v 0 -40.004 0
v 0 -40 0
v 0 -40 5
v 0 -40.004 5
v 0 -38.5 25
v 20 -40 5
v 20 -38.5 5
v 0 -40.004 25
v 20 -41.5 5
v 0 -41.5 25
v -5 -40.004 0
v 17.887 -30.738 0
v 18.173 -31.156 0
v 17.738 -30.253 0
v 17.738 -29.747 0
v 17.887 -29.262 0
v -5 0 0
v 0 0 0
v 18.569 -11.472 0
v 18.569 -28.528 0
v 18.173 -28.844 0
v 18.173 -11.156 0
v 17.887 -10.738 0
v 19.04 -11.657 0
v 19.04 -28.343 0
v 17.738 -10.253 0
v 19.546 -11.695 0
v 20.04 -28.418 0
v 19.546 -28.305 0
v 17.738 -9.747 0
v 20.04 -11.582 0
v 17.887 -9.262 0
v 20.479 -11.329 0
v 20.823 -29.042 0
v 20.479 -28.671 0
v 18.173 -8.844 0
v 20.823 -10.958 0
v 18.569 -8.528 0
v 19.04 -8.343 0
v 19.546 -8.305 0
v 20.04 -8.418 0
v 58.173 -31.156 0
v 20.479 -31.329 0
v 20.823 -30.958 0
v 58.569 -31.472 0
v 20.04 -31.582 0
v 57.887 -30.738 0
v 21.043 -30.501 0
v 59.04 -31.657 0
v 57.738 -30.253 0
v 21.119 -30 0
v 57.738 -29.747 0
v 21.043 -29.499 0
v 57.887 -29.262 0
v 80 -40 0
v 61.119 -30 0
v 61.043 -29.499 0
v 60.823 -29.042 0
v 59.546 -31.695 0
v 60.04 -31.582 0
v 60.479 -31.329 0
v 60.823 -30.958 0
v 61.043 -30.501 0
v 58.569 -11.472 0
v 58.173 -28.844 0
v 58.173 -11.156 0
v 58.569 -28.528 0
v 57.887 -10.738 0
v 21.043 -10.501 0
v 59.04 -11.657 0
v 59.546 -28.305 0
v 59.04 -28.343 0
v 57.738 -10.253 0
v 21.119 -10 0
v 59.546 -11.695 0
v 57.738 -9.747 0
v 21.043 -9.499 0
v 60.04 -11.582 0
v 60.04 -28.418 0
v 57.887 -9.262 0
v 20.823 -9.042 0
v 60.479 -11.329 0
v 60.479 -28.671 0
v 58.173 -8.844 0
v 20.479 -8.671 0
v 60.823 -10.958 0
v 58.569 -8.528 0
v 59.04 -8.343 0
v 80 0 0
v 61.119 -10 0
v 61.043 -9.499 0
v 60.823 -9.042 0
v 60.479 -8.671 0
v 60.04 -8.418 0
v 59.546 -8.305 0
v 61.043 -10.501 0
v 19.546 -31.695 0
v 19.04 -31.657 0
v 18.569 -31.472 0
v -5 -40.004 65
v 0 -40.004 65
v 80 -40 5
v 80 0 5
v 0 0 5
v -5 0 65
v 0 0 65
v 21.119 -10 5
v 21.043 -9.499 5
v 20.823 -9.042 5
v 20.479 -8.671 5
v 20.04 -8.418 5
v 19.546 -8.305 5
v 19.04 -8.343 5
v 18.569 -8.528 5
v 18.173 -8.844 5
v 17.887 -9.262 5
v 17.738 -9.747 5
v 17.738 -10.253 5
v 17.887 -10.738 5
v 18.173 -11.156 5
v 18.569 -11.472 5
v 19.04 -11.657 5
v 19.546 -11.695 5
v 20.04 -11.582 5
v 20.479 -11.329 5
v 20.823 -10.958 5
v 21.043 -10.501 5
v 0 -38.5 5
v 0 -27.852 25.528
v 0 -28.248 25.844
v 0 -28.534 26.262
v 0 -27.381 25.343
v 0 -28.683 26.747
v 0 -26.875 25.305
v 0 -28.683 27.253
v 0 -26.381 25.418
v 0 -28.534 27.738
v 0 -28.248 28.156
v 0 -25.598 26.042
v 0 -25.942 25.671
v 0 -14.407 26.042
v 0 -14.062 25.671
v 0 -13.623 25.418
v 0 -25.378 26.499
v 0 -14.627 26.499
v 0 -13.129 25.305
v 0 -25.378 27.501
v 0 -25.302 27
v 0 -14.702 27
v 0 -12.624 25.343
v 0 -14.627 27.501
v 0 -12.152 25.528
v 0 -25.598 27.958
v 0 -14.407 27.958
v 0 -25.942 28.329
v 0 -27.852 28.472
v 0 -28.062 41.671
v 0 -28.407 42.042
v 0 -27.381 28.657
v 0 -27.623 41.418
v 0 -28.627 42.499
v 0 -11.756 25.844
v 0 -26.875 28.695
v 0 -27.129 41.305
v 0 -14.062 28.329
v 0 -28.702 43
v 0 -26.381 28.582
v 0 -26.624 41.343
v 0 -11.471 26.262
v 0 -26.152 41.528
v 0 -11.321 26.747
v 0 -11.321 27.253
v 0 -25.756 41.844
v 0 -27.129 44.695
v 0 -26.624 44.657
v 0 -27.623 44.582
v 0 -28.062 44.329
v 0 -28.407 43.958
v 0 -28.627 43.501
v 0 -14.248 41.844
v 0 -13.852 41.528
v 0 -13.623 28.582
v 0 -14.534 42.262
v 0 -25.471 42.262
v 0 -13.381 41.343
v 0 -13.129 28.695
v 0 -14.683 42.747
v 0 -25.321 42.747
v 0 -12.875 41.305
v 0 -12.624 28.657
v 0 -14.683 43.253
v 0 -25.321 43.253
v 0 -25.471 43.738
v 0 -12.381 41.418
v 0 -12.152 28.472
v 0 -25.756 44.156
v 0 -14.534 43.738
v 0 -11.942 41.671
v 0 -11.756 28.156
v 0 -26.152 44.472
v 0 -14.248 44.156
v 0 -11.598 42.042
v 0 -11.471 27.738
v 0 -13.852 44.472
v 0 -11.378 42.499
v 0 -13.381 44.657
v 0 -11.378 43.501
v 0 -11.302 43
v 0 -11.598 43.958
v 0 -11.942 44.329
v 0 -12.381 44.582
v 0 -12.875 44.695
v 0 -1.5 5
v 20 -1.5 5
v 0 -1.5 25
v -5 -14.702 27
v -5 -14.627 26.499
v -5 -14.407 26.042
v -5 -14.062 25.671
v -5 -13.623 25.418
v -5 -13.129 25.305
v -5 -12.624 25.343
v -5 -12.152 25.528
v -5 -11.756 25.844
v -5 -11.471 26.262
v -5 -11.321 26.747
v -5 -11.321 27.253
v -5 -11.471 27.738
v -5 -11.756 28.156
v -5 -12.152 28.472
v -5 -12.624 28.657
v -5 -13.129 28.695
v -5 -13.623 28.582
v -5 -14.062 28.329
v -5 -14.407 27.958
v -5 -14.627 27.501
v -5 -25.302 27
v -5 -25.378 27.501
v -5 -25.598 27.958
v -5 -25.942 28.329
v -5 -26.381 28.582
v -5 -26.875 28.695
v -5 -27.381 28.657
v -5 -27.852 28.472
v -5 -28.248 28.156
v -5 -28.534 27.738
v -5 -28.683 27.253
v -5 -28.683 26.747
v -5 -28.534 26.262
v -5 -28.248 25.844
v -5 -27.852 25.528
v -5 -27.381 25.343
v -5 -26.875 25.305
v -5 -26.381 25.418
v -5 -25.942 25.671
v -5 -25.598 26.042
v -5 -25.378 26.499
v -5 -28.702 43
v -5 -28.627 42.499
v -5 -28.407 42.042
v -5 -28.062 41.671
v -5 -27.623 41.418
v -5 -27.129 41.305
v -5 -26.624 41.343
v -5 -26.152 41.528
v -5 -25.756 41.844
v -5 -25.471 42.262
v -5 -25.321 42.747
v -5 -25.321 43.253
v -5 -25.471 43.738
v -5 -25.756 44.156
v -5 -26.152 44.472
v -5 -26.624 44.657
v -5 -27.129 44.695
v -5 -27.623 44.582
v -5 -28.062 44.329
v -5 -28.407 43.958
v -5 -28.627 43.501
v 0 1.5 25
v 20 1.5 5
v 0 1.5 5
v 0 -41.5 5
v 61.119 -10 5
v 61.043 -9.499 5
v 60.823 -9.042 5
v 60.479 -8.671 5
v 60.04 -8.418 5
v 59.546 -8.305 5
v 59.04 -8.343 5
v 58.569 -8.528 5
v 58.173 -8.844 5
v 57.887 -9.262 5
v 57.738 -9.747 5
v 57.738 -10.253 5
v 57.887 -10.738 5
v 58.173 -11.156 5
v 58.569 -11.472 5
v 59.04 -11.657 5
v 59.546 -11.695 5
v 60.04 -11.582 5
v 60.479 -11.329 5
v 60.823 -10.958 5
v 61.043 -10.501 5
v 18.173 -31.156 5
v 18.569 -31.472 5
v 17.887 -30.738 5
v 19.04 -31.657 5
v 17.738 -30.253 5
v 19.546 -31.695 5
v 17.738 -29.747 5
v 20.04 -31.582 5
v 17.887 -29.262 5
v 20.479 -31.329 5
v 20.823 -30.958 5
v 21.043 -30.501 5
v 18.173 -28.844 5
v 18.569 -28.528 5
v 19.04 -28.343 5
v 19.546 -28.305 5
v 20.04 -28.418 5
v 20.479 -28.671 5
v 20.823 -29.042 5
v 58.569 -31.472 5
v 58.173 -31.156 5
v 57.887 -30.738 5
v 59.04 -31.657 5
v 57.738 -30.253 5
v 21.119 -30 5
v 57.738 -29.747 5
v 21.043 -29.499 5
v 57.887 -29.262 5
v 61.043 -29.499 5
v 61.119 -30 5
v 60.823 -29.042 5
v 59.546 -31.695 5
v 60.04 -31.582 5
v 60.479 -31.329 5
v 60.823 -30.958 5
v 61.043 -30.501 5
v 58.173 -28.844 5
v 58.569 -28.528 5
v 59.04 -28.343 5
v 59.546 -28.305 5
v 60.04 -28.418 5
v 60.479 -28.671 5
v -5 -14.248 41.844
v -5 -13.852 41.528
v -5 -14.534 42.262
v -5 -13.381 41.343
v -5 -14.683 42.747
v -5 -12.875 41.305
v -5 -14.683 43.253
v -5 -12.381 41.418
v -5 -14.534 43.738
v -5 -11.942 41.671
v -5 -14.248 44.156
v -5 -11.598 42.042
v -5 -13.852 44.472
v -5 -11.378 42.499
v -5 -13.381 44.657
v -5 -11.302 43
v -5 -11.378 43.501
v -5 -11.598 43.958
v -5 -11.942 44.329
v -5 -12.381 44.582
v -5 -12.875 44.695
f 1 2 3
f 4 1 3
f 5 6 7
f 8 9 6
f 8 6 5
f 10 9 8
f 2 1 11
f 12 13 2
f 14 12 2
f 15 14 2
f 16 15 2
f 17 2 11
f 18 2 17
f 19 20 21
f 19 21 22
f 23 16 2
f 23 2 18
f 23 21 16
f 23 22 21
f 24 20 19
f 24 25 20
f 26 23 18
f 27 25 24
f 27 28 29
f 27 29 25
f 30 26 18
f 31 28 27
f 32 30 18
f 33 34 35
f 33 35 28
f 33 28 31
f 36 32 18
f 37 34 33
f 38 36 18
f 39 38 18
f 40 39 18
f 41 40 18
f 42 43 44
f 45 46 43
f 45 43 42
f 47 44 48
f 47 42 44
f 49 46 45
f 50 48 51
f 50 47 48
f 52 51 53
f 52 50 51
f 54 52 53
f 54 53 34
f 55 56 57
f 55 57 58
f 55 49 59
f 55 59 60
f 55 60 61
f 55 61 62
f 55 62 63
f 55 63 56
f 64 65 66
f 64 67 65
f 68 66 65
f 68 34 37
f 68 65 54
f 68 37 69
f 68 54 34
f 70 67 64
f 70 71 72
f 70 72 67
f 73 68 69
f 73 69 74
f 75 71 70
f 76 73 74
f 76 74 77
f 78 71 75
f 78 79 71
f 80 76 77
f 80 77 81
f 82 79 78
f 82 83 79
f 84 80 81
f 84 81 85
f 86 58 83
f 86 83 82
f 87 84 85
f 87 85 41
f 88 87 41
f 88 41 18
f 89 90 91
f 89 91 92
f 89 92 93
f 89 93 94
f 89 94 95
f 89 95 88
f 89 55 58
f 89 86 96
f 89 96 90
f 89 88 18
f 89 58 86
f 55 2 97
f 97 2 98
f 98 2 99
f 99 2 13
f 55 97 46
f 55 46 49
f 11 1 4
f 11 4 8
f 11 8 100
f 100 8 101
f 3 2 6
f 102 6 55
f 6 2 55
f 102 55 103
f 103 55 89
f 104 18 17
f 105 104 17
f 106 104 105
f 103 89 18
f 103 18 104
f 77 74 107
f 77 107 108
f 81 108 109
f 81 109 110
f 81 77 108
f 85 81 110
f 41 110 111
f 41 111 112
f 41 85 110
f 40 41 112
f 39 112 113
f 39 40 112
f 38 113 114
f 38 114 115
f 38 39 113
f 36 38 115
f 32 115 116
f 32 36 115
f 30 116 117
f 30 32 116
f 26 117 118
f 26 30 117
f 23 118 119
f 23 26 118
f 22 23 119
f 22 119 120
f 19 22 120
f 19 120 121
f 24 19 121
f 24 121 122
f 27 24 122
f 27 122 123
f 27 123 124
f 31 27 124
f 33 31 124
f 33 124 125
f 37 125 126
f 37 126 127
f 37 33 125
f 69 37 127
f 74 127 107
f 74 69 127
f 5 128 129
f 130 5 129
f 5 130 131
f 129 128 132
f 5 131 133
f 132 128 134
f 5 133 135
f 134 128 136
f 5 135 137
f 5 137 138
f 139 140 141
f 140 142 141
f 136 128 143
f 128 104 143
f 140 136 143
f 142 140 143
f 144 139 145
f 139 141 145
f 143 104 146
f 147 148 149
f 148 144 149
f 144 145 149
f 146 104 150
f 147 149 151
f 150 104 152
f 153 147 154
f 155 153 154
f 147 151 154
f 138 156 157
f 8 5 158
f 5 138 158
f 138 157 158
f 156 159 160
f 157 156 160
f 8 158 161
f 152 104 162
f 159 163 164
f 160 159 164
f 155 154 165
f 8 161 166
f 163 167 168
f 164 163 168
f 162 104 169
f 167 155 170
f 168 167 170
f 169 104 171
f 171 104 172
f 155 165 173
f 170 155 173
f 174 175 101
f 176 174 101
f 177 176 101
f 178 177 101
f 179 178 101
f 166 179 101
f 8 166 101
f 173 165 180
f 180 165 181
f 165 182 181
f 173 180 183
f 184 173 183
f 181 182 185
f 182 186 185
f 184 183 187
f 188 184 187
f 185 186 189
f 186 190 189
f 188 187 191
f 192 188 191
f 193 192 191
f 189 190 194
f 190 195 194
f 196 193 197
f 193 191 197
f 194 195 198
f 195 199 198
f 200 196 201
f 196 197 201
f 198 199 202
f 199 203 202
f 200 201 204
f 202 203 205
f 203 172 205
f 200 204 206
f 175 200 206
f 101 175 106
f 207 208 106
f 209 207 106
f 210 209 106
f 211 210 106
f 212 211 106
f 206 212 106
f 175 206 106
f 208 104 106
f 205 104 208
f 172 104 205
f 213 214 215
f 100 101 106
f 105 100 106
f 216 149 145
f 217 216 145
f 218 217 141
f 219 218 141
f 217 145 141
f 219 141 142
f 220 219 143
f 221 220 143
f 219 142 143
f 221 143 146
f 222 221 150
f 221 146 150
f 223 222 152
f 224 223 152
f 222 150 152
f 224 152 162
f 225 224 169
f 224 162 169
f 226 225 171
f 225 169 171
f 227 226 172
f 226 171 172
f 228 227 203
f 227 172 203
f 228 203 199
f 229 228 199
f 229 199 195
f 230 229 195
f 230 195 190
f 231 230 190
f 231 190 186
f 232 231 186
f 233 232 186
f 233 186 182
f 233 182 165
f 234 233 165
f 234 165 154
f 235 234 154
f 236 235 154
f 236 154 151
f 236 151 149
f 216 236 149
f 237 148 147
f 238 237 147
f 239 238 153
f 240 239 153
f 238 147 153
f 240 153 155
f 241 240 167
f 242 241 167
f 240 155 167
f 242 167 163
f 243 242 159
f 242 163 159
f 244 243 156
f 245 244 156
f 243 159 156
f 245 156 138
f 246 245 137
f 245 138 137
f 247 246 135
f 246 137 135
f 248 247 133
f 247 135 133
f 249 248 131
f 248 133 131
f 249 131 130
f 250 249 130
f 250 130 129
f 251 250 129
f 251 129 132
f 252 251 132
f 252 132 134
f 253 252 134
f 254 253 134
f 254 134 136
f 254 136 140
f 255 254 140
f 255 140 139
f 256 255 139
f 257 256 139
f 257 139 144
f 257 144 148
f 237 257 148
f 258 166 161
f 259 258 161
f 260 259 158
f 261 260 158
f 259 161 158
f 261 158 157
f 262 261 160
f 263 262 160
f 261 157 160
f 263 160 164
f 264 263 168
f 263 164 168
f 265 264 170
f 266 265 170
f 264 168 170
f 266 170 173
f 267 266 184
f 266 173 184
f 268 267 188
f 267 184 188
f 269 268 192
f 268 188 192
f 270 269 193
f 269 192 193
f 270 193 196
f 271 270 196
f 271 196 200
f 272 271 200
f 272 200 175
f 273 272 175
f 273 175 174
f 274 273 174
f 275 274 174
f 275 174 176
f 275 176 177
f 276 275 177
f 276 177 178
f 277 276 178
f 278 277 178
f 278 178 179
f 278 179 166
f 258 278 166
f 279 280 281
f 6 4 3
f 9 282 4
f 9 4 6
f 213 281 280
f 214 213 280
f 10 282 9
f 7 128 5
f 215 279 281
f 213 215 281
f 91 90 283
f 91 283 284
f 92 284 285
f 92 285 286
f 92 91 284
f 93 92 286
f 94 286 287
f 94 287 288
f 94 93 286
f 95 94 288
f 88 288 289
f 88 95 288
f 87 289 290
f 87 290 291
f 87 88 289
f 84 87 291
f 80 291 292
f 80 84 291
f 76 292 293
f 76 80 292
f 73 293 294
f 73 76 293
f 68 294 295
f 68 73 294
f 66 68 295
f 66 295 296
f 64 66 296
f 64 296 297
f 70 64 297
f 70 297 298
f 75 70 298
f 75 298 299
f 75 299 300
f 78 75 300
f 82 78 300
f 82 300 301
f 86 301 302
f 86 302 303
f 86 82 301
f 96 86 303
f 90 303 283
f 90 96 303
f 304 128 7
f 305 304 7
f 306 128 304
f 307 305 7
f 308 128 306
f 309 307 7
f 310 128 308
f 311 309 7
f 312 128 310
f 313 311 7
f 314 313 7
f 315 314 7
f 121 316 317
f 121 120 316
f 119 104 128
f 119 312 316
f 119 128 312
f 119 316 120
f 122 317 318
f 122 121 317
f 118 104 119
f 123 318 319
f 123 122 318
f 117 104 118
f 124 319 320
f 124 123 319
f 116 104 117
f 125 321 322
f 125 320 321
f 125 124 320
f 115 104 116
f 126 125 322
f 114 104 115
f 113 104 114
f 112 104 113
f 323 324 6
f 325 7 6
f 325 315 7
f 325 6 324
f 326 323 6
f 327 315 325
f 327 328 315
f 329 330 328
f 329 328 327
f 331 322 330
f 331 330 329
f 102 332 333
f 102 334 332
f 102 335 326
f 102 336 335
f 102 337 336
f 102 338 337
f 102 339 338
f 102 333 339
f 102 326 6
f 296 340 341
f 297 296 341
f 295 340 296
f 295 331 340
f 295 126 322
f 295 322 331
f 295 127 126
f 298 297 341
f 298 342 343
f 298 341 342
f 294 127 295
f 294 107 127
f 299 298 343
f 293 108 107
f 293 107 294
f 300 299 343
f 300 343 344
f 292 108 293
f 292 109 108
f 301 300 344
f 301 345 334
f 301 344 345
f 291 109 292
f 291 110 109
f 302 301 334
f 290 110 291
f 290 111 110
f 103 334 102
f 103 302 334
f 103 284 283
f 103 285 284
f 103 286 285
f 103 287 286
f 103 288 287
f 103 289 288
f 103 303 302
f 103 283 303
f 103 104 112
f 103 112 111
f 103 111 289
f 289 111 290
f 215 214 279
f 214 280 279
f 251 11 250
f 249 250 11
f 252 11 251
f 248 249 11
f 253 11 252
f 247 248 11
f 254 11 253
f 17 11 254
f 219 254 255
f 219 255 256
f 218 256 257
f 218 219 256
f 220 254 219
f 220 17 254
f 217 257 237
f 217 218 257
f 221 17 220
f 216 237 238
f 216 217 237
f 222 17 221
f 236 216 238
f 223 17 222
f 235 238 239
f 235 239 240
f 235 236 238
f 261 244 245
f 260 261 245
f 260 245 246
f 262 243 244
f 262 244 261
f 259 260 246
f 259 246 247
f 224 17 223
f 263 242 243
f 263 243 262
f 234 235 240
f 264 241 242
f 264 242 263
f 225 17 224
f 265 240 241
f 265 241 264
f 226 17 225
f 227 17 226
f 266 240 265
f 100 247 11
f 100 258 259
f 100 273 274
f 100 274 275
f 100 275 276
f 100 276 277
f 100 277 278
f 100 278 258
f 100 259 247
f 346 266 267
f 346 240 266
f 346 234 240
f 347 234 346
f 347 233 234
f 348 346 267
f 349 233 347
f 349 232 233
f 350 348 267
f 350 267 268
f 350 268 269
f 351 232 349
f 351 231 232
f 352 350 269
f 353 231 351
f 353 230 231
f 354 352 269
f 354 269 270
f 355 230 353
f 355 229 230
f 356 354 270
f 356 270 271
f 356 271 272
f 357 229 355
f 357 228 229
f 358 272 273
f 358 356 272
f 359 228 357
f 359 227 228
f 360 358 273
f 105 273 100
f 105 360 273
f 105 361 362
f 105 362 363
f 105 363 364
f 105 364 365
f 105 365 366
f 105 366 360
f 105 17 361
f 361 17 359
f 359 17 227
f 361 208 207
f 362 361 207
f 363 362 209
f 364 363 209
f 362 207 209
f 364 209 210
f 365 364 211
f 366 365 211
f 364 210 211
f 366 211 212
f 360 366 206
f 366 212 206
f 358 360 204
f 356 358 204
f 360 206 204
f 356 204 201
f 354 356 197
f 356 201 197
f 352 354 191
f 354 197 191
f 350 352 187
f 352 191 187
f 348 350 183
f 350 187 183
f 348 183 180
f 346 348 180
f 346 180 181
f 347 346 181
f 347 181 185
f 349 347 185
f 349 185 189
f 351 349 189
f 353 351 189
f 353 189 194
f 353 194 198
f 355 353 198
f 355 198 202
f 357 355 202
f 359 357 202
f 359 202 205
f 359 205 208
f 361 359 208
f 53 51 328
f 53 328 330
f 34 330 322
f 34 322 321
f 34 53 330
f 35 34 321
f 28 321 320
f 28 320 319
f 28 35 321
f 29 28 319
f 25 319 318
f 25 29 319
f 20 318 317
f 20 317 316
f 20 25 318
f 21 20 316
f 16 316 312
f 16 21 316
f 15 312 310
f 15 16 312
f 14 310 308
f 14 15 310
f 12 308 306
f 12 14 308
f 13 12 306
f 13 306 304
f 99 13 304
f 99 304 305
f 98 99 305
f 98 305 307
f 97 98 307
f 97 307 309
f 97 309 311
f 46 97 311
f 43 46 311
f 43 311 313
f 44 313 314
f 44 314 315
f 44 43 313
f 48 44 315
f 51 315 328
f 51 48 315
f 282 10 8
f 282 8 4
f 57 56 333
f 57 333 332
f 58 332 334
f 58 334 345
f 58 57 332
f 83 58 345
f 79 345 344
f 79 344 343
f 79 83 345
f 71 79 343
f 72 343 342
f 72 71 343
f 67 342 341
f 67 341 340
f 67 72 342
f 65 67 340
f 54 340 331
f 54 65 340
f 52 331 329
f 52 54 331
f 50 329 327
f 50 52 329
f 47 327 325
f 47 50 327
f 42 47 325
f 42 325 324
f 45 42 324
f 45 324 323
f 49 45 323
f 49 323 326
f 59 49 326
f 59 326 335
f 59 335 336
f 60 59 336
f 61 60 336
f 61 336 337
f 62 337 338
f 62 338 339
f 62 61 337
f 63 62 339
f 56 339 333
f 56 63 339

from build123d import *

# Parameters (mm, degrees)
SKETCH_1_W          = 80
SKETCH_1_H          = 40
SKETCH_1_R          = 1.7
EXTRUDE_1_DEPTH     = 5
SKETCH_4_W          = 65
SKETCH_4_H          = 40.004466265
EXTRUDE_4_DEPTH     = 5
SKETCH_5_R          = 1.7
CUT_EXTRUDE_1_DEPTH = 10
EXTRUDE_6_DEPTH     = 1.5
EXTRUDE_7_DEPTH     = 1.5


with BuildPart() as part:
    # 草图1 → 凸台-拉伸1 (new body)
    with BuildSketch(Plane.XY):
        with Locations((40, -20)):
            Rectangle(SKETCH_1_W, SKETCH_1_H)
        with Locations((19.418738728, -30)):
            Circle(SKETCH_1_R, mode=Mode.SUBTRACT)
        with Locations((59.418738728, -30)):
            Circle(SKETCH_1_R, mode=Mode.SUBTRACT)
        with BuildLine():
            ThreePointArc((21.118738728, -10), (20.620820256, -11.202081528), (19.418738728, -11.7))
            ThreePointArc((19.418738728, -11.7), (18.2166572, -8.797918472), (21.118738728, -10))
        make_face(mode=Mode.SUBTRACT)
        with Locations((59.418738728, -10)):
            Circle(SKETCH_1_R, mode=Mode.SUBTRACT)
    extrude(amount=EXTRUDE_1_DEPTH)

    # 草图4 → 凸台-拉伸4 (add)
    with BuildSketch(Plane.ZY):
        with Locations((32.5, -20.002233133)):
            Rectangle(SKETCH_4_W, SKETCH_4_H)
    extrude(amount=EXTRUDE_4_DEPTH)

    # 草图5 → 切除-拉伸1 (cut)
    with BuildSketch(Plane(origin=(0, 0, 0), x_dir=(0, 0, -1), z_dir=(1, 0, 0))):
        with Locations((-43, -13.002233132)):
            Circle(SKETCH_5_R)
        with Locations((-27, -13.002233132)):
            Circle(SKETCH_5_R)
        with Locations((-27, -27.002233132)):
            Circle(SKETCH_5_R)
        with Locations((-43, -27.002233132)):
            Circle(SKETCH_5_R)
    extrude(amount=-CUT_EXTRUDE_1_DEPTH, mode=Mode.SUBTRACT)

    # 草图8 → 凸台-拉伸7 (add, symmetric)
    with BuildSketch(Plane.XZ.offset(40)):
        Polygon((0, 5), (20, 5), (0, 25), align=None)
    extrude(amount=EXTRUDE_7_DEPTH, both=True)


with BuildPart() as body_2:
    # 草图6 → 凸台-拉伸6 (new, symmetric)
    with BuildSketch(Plane(origin=(0, 0, 0), x_dir=(1, 0, 0), z_dir=(0, 1, 0))):
        Polygon((0, -5), (20, -5), (0, -25), align=None)
    extrude(amount=EXTRUDE_6_DEPTH, both=True)


solid = Compound([part.part, body_2.part])
